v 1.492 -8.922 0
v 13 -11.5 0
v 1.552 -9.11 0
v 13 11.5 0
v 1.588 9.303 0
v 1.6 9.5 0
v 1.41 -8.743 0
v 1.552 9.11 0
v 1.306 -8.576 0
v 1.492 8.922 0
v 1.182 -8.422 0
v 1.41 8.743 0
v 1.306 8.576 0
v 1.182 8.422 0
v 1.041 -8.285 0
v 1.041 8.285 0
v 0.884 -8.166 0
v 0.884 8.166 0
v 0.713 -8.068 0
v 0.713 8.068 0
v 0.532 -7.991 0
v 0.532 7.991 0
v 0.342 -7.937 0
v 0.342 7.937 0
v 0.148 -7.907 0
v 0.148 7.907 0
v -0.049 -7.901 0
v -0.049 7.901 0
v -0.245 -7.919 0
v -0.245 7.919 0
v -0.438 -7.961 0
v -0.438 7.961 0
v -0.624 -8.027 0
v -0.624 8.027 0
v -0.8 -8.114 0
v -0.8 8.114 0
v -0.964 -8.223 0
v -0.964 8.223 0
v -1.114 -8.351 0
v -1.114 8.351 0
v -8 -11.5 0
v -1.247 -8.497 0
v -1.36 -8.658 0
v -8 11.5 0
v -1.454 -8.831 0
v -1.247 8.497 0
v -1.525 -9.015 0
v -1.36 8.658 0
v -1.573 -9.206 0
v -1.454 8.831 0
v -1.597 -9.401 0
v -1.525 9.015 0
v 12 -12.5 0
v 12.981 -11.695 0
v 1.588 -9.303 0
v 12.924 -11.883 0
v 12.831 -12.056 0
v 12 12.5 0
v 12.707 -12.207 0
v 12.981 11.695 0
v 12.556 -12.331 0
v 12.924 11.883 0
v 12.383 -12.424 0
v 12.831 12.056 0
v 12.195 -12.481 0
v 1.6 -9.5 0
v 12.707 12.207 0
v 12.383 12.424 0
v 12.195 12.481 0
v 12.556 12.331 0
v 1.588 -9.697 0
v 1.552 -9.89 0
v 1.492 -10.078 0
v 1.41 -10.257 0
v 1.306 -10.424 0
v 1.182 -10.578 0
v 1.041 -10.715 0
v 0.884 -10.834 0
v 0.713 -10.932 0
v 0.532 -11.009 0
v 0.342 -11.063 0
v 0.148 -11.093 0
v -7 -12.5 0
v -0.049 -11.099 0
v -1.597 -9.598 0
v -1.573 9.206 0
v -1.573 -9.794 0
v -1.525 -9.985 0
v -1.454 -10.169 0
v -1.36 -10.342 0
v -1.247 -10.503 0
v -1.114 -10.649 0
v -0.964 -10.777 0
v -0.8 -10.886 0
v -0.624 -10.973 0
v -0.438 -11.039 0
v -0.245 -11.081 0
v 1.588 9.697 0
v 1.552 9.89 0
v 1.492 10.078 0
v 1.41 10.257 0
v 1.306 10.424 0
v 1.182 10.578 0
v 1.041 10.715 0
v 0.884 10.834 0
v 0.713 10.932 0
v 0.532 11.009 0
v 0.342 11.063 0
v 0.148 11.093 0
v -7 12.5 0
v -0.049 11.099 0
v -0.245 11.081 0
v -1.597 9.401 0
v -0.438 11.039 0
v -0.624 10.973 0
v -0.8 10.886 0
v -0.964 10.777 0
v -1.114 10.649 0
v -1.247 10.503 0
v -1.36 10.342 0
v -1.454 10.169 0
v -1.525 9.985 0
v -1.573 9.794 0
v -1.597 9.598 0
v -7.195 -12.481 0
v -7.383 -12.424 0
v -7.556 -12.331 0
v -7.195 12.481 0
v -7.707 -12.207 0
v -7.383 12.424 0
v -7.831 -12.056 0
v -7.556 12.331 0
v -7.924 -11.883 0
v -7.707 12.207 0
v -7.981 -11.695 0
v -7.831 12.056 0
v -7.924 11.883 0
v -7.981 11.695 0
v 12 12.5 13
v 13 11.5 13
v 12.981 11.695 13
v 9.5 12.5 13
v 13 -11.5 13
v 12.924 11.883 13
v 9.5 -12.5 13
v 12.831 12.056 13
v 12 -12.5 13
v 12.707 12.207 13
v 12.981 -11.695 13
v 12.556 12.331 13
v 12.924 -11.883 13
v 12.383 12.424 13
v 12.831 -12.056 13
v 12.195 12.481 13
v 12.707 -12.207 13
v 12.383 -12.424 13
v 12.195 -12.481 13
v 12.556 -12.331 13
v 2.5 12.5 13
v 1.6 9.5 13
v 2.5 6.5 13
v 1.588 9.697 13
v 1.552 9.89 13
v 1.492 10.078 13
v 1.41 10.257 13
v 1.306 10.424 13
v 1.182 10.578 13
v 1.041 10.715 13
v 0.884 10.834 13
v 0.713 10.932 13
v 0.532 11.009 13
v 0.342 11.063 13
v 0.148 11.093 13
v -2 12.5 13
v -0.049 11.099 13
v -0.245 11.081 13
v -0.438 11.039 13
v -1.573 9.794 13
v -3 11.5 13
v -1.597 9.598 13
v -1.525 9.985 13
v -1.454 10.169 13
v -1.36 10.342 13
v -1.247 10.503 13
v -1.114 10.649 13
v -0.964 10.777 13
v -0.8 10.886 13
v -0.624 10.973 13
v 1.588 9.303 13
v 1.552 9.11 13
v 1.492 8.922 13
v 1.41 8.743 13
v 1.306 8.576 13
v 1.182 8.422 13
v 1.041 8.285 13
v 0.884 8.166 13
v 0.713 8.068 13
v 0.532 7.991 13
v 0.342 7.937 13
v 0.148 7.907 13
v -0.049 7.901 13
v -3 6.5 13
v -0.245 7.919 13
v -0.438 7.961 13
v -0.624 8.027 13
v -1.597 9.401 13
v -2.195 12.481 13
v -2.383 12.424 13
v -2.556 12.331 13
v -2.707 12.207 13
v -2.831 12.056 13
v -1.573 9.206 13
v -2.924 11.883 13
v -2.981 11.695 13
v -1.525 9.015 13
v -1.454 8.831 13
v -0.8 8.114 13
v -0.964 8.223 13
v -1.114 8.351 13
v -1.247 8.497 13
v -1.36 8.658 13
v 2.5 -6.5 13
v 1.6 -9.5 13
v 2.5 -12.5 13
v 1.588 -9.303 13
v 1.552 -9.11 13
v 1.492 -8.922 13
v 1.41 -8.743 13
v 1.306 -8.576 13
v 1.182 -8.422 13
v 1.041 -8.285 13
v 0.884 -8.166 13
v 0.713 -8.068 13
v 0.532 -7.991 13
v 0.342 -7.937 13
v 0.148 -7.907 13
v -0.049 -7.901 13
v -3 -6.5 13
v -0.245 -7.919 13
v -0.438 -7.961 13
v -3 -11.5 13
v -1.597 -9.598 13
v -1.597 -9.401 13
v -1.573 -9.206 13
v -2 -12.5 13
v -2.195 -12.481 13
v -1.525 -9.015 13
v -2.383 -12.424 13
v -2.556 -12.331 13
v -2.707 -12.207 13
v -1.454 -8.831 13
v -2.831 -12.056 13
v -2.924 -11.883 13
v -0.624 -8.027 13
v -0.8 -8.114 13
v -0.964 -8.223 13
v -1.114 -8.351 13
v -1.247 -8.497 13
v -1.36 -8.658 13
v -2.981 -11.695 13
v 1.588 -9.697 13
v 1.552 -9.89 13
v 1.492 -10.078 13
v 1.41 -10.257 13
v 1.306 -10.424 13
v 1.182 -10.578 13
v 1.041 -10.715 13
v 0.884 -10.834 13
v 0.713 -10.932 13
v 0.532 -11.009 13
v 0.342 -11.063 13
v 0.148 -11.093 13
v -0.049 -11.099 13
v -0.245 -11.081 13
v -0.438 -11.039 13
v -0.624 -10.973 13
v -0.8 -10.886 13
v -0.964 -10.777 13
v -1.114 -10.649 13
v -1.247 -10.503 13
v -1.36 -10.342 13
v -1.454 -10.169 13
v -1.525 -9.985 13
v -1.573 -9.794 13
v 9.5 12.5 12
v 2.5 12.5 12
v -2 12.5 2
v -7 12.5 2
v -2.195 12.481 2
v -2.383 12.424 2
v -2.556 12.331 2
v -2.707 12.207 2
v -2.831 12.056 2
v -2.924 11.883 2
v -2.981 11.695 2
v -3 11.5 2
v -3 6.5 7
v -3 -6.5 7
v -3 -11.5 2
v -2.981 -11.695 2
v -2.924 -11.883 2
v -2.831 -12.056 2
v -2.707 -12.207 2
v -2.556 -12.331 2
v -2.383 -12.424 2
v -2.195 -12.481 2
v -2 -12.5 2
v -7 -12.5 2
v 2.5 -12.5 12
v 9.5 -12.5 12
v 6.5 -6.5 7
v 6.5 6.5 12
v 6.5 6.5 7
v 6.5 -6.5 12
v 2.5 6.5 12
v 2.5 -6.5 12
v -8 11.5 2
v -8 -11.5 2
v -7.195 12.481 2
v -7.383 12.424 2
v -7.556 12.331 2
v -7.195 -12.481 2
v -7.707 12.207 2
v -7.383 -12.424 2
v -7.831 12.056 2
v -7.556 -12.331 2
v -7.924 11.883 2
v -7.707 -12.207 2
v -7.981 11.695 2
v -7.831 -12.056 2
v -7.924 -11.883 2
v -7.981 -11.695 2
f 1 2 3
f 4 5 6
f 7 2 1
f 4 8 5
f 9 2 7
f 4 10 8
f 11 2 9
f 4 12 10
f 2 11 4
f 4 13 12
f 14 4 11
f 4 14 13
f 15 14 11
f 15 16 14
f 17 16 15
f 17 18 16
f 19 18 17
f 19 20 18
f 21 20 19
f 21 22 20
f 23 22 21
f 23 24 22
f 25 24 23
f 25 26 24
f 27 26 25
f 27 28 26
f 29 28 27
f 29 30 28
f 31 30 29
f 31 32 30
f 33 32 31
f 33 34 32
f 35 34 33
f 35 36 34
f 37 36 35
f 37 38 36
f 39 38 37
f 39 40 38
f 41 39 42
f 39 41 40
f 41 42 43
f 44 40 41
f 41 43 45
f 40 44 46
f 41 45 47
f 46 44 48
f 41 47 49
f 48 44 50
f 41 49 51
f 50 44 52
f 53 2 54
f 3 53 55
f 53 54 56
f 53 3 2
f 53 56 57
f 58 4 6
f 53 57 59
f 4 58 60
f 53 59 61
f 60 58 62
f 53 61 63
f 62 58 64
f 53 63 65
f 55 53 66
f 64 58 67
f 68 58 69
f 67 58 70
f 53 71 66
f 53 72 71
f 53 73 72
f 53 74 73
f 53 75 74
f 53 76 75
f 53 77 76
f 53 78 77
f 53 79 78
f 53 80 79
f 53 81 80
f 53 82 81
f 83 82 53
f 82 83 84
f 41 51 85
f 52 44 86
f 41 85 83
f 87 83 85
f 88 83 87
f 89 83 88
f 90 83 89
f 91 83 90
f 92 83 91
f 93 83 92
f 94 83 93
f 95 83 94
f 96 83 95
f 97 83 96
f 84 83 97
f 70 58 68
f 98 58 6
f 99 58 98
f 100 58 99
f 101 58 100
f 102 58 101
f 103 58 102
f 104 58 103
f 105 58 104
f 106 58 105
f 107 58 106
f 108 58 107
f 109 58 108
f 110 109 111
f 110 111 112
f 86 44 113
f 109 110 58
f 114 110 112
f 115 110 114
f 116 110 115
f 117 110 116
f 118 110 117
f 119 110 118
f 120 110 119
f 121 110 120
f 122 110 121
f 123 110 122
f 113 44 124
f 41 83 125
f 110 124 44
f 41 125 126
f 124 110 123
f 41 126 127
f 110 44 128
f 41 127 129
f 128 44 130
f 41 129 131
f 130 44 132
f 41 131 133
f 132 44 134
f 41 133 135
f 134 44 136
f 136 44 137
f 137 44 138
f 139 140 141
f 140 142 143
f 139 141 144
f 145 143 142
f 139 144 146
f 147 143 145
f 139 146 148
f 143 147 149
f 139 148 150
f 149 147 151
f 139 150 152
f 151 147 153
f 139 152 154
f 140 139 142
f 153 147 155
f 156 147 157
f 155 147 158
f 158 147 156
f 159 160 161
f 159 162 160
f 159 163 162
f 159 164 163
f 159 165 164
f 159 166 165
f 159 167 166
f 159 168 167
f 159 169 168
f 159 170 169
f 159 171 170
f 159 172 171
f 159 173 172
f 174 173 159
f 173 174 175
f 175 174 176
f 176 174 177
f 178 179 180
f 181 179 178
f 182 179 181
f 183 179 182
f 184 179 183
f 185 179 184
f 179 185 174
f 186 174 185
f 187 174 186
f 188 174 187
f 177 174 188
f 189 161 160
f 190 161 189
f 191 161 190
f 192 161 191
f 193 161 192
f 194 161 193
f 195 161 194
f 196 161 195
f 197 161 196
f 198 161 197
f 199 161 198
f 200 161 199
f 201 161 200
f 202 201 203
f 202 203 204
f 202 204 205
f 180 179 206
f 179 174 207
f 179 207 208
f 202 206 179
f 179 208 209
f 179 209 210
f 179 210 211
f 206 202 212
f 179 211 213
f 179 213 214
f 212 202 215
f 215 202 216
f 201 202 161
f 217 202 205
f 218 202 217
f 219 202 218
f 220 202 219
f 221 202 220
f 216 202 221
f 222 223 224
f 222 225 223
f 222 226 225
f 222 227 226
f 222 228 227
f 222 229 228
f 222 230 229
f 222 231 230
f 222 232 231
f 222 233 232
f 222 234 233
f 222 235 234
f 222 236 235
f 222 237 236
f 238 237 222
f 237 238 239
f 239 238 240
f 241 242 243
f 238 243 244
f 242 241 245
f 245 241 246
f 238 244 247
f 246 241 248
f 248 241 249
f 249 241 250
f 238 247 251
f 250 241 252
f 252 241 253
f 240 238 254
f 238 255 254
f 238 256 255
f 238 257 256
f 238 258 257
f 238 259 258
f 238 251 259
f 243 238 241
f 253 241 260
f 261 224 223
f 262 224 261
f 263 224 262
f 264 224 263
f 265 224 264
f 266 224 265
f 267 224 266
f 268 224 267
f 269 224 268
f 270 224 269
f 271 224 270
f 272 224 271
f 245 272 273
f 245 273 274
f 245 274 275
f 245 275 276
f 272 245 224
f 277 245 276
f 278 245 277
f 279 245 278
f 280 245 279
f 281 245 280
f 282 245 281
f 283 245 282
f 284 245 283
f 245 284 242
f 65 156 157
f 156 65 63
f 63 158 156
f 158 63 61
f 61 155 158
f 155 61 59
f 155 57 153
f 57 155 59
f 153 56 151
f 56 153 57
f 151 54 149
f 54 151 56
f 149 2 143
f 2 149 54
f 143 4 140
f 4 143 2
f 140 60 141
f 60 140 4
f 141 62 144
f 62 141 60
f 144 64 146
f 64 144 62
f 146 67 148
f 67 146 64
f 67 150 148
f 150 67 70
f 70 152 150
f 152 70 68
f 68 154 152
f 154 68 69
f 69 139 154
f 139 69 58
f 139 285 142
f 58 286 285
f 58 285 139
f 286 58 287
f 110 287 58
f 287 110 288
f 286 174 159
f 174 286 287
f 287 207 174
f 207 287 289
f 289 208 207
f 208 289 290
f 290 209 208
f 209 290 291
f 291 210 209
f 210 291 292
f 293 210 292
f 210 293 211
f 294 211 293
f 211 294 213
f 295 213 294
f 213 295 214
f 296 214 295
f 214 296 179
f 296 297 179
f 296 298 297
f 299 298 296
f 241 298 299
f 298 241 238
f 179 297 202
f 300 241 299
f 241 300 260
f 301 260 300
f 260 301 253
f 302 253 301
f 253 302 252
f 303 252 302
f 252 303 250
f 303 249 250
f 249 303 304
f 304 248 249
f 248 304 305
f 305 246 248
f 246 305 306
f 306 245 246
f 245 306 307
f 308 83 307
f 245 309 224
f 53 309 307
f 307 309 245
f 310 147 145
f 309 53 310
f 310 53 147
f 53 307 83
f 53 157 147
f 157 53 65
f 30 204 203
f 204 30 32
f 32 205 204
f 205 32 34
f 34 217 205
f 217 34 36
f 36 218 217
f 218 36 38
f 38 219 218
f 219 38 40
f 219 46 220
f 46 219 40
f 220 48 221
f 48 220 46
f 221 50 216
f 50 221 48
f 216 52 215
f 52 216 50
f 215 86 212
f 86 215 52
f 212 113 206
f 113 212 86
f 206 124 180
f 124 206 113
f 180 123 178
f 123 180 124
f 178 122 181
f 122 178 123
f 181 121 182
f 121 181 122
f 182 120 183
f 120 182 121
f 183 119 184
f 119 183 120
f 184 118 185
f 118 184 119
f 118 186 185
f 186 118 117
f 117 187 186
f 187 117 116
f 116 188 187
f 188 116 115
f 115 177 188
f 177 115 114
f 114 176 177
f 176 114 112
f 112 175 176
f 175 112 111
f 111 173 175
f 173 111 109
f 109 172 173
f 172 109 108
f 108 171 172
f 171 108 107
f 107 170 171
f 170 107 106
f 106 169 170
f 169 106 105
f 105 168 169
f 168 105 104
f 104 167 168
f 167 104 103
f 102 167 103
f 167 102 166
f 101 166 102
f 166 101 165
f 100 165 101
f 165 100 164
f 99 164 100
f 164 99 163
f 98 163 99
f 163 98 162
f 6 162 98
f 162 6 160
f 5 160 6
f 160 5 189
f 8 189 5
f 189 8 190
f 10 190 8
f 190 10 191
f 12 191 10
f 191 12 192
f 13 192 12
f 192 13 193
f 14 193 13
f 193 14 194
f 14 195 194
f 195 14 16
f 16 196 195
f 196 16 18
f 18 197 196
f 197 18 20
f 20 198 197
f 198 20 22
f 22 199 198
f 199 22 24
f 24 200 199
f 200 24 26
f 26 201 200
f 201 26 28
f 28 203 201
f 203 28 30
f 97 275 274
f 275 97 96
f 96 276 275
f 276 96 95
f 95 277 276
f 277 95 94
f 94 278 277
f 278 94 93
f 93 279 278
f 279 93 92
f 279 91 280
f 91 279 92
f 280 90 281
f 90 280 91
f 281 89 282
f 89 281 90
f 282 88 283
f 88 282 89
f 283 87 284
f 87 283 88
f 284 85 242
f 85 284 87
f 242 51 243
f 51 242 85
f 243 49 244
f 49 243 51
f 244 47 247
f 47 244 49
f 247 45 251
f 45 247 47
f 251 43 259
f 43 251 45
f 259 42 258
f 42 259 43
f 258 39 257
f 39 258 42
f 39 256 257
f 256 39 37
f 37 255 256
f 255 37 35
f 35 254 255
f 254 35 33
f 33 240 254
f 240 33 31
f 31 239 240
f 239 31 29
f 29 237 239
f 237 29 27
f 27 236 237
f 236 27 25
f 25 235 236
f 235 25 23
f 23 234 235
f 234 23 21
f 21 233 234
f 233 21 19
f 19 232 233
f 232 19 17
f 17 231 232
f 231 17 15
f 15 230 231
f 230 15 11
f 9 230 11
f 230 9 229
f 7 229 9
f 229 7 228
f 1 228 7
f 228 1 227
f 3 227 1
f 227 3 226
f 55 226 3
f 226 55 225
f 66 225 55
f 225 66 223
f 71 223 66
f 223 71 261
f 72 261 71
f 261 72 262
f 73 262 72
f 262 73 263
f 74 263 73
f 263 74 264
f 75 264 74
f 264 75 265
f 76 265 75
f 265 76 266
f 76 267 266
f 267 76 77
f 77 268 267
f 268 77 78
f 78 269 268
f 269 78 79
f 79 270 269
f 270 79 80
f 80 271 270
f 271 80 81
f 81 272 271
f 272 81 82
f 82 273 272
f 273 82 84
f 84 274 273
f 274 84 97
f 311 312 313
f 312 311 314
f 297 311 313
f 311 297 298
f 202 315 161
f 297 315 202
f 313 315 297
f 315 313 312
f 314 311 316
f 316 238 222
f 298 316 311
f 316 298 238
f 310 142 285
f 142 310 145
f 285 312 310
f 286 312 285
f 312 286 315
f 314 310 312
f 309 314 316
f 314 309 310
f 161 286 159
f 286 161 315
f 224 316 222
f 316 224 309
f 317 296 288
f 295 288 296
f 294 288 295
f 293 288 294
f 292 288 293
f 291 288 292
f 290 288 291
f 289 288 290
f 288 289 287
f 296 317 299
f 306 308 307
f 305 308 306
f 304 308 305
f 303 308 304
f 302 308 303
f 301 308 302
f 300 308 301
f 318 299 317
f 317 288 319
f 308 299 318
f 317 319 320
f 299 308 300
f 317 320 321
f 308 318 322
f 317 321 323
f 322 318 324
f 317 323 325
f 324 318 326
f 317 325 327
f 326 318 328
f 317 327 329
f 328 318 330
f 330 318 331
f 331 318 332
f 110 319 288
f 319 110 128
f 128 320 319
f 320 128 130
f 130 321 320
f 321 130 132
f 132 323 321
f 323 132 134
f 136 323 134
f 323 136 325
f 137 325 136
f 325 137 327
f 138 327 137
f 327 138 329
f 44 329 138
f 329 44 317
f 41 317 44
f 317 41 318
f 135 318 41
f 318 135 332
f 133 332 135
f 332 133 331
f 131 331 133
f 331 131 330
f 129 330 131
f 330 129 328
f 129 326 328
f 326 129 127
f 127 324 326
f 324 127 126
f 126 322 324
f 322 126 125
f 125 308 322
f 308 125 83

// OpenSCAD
h = 7;

$fs = .2;
$fa = 2;

if(h > 2) linear_extrude(2) difference() {
	offset(1) offset(-1) square([16, 25], center = true);
	for(i = [1, -1]) translate([0, i * 19 / 2, 0]) circle(2);
}
difference() {
	linear_extrude(h + 6, convexity = 5) difference() {
		offset(1) offset(-1) translate([-3, -25 / 2, 0]) square([16, 25]);
		for(i = [1, -1]) translate([0, i * 19 / 2, 0]) circle(1.6);
	}
	translate([0, 0, h + 6]) cube([13, 13, 12], center = true);
	translate([6, 0, h + 6]) cube([7, 30, 2], center = true);
}
